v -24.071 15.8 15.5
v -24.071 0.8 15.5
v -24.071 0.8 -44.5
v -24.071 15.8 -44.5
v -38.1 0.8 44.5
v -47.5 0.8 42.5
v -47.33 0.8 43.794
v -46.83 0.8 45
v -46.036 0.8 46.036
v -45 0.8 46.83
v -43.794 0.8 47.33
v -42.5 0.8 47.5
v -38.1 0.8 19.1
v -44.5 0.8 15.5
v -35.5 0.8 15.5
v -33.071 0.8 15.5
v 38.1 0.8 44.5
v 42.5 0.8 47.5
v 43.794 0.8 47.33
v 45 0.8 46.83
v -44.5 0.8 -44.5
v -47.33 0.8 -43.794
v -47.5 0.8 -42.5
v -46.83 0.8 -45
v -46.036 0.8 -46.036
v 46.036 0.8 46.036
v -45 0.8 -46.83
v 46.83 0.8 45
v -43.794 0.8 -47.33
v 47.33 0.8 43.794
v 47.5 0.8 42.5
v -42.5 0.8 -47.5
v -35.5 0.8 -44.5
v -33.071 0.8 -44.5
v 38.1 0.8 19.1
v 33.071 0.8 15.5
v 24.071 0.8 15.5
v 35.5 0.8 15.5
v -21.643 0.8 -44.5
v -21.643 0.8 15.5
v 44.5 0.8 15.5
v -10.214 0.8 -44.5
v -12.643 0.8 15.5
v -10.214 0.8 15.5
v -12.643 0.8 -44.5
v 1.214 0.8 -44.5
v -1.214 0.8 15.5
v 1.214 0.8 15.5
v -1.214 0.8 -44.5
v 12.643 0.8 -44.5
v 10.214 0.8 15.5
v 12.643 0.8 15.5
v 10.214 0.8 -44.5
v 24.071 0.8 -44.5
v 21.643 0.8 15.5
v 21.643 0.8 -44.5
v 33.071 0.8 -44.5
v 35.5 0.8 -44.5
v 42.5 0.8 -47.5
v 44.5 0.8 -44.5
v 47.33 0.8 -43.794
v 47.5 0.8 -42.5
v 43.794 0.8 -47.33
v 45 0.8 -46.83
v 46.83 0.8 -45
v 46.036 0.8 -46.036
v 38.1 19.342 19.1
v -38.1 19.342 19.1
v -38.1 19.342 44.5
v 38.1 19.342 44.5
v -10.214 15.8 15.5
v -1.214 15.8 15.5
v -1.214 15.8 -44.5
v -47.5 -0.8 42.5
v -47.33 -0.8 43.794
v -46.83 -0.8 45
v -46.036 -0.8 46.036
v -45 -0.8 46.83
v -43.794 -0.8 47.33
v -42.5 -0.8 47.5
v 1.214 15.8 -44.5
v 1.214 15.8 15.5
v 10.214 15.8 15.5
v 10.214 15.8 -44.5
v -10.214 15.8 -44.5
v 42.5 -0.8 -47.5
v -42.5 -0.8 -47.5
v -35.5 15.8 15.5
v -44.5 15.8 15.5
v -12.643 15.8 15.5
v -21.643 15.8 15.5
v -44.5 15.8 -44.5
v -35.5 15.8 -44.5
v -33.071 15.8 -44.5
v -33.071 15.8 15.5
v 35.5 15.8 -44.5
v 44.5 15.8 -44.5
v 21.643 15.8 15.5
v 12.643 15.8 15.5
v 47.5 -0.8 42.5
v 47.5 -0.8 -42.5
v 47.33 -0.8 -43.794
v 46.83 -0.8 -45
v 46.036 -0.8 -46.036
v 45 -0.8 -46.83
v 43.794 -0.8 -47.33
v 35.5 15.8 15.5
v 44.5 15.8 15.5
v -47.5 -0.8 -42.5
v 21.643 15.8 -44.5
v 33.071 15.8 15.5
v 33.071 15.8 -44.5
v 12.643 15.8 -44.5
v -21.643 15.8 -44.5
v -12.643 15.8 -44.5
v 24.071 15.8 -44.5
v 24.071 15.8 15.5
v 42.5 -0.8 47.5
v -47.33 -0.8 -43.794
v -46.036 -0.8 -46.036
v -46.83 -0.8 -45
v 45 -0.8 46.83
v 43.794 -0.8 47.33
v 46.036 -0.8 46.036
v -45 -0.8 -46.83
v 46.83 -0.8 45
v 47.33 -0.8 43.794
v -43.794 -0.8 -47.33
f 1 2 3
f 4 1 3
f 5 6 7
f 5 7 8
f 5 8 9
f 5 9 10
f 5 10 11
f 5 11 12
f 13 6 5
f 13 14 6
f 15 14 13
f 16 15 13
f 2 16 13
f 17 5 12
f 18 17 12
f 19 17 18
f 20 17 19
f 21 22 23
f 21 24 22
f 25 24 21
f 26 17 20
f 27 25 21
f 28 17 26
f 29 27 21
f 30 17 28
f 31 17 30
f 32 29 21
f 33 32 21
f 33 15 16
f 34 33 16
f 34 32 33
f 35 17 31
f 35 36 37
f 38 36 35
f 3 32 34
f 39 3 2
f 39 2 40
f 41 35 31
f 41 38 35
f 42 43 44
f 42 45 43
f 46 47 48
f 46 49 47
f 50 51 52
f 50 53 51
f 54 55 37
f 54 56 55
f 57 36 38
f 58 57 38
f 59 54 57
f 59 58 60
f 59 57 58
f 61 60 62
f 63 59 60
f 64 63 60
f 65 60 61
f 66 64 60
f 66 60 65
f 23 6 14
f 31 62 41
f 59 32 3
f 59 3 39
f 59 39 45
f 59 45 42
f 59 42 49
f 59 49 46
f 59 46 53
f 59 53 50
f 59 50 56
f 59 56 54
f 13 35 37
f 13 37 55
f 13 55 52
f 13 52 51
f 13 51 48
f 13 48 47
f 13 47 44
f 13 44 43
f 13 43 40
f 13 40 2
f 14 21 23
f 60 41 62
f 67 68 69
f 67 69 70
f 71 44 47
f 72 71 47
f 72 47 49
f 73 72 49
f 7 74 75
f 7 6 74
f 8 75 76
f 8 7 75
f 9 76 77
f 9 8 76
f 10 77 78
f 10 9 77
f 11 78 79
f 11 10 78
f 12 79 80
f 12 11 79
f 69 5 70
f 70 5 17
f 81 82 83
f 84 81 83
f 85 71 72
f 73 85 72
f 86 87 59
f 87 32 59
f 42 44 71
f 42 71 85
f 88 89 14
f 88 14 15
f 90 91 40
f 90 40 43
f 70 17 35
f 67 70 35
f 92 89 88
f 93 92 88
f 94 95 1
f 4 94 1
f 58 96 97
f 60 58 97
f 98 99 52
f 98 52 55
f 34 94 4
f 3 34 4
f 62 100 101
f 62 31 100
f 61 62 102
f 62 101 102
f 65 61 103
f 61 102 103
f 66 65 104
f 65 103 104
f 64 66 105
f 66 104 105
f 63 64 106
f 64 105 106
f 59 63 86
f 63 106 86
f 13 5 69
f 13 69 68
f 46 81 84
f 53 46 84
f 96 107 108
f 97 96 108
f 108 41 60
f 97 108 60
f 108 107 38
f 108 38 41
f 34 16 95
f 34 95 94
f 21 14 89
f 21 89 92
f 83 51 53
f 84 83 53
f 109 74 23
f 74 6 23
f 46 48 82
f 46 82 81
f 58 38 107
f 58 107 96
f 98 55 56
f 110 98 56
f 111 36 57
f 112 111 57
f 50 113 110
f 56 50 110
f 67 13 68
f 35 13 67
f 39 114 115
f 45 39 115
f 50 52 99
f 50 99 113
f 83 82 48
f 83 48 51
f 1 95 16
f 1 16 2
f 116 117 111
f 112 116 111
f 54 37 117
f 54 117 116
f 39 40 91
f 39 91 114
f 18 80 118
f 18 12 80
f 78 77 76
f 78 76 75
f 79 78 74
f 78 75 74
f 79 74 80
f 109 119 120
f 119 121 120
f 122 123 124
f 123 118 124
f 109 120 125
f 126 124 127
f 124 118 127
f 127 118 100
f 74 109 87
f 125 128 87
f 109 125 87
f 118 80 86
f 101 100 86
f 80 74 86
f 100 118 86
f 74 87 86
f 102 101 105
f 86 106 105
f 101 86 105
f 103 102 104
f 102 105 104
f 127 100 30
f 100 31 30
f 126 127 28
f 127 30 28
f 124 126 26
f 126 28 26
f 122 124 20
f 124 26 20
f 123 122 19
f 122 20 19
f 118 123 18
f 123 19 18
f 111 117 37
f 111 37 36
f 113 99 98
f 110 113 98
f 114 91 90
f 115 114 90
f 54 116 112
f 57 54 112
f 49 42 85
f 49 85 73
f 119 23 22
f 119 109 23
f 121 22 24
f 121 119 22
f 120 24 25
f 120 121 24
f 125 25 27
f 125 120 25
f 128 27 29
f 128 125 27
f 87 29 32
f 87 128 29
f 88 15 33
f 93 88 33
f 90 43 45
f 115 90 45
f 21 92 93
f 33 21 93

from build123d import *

# Parameters (mm, degrees)
SKETCH1_W           = 95
SKETCH1_H           = 95
BOSS_EXTRUDE1_DEPTH = 0.8
FILLET1_R           = 5
SKETCH2_W           = 76.2
SKETCH2_H           = 25.4
BOSS_EXTRUDE2_DEPTH = 18.542
SKETCH3_W           = 9
SKETCH3_H           = 60
BOSS_EXTRUDE3_DEPTH = 15


with BuildPart() as part:
    # Sketch1 → Boss-Extrude1 (new, symmetric)
    with BuildSketch(Plane(origin=(0, 0, 0), x_dir=(1, 0, 0), z_dir=(0, 1, 0))):
        Rectangle(SKETCH1_W, SKETCH1_H)
    extrude(amount=BOSS_EXTRUDE1_DEPTH, both=True)

    # Fillet1
    fillet1_edges = [part.edges().sort_by_distance(p)[0] for p in [
        (47.5, 0, 47.5),
        (-47.5, 0, 47.5),
        (-47.5, 0, -47.5),
        (47.5, 0, -47.5),
    ]]
    fillet(fillet1_edges, radius=FILLET1_R)

    # Sketch2 → Boss-Extrude2 (add)
    with BuildSketch(Plane(origin=(0, 0.8, 0), x_dir=(1, 0, 0), z_dir=(0, 1, 0))):
        with Locations((0, -31.8)):
            Rectangle(SKETCH2_W, SKETCH2_H)
    extrude(amount=BOSS_EXTRUDE2_DEPTH)

    # Sketch3 → Boss-Extrude3 (add)
    with BuildSketch(Plane(origin=(0, 0.8, 0), x_dir=(1, 0, 0), z_dir=(0, 1, 0))):
        with Locations((-40, 14.5)):
            Rectangle(SKETCH3_W, SKETCH3_H)
        with Locations((-28.571428571, 14.5)):
            Rectangle(SKETCH3_W, SKETCH3_H)
        with Locations((-17.142857143, 14.5)):
            Rectangle(SKETCH3_W, SKETCH3_H)
        with Locations((-5.714285714, 14.5)):
            Rectangle(SKETCH3_W, SKETCH3_H)
        with Locations((5.714285714, 14.5)):
            Rectangle(SKETCH3_W, SKETCH3_H)
        with Locations((17.142857143, 14.5)):
            Rectangle(SKETCH3_W, SKETCH3_H)
        with Locations((28.571428571, 14.5)):
            Rectangle(SKETCH3_W, SKETCH3_H)
        with Locations((40, 14.5)):
            Rectangle(SKETCH3_W, SKETCH3_H)
    extrude(amount=BOSS_EXTRUDE3_DEPTH)


solid = part.part
